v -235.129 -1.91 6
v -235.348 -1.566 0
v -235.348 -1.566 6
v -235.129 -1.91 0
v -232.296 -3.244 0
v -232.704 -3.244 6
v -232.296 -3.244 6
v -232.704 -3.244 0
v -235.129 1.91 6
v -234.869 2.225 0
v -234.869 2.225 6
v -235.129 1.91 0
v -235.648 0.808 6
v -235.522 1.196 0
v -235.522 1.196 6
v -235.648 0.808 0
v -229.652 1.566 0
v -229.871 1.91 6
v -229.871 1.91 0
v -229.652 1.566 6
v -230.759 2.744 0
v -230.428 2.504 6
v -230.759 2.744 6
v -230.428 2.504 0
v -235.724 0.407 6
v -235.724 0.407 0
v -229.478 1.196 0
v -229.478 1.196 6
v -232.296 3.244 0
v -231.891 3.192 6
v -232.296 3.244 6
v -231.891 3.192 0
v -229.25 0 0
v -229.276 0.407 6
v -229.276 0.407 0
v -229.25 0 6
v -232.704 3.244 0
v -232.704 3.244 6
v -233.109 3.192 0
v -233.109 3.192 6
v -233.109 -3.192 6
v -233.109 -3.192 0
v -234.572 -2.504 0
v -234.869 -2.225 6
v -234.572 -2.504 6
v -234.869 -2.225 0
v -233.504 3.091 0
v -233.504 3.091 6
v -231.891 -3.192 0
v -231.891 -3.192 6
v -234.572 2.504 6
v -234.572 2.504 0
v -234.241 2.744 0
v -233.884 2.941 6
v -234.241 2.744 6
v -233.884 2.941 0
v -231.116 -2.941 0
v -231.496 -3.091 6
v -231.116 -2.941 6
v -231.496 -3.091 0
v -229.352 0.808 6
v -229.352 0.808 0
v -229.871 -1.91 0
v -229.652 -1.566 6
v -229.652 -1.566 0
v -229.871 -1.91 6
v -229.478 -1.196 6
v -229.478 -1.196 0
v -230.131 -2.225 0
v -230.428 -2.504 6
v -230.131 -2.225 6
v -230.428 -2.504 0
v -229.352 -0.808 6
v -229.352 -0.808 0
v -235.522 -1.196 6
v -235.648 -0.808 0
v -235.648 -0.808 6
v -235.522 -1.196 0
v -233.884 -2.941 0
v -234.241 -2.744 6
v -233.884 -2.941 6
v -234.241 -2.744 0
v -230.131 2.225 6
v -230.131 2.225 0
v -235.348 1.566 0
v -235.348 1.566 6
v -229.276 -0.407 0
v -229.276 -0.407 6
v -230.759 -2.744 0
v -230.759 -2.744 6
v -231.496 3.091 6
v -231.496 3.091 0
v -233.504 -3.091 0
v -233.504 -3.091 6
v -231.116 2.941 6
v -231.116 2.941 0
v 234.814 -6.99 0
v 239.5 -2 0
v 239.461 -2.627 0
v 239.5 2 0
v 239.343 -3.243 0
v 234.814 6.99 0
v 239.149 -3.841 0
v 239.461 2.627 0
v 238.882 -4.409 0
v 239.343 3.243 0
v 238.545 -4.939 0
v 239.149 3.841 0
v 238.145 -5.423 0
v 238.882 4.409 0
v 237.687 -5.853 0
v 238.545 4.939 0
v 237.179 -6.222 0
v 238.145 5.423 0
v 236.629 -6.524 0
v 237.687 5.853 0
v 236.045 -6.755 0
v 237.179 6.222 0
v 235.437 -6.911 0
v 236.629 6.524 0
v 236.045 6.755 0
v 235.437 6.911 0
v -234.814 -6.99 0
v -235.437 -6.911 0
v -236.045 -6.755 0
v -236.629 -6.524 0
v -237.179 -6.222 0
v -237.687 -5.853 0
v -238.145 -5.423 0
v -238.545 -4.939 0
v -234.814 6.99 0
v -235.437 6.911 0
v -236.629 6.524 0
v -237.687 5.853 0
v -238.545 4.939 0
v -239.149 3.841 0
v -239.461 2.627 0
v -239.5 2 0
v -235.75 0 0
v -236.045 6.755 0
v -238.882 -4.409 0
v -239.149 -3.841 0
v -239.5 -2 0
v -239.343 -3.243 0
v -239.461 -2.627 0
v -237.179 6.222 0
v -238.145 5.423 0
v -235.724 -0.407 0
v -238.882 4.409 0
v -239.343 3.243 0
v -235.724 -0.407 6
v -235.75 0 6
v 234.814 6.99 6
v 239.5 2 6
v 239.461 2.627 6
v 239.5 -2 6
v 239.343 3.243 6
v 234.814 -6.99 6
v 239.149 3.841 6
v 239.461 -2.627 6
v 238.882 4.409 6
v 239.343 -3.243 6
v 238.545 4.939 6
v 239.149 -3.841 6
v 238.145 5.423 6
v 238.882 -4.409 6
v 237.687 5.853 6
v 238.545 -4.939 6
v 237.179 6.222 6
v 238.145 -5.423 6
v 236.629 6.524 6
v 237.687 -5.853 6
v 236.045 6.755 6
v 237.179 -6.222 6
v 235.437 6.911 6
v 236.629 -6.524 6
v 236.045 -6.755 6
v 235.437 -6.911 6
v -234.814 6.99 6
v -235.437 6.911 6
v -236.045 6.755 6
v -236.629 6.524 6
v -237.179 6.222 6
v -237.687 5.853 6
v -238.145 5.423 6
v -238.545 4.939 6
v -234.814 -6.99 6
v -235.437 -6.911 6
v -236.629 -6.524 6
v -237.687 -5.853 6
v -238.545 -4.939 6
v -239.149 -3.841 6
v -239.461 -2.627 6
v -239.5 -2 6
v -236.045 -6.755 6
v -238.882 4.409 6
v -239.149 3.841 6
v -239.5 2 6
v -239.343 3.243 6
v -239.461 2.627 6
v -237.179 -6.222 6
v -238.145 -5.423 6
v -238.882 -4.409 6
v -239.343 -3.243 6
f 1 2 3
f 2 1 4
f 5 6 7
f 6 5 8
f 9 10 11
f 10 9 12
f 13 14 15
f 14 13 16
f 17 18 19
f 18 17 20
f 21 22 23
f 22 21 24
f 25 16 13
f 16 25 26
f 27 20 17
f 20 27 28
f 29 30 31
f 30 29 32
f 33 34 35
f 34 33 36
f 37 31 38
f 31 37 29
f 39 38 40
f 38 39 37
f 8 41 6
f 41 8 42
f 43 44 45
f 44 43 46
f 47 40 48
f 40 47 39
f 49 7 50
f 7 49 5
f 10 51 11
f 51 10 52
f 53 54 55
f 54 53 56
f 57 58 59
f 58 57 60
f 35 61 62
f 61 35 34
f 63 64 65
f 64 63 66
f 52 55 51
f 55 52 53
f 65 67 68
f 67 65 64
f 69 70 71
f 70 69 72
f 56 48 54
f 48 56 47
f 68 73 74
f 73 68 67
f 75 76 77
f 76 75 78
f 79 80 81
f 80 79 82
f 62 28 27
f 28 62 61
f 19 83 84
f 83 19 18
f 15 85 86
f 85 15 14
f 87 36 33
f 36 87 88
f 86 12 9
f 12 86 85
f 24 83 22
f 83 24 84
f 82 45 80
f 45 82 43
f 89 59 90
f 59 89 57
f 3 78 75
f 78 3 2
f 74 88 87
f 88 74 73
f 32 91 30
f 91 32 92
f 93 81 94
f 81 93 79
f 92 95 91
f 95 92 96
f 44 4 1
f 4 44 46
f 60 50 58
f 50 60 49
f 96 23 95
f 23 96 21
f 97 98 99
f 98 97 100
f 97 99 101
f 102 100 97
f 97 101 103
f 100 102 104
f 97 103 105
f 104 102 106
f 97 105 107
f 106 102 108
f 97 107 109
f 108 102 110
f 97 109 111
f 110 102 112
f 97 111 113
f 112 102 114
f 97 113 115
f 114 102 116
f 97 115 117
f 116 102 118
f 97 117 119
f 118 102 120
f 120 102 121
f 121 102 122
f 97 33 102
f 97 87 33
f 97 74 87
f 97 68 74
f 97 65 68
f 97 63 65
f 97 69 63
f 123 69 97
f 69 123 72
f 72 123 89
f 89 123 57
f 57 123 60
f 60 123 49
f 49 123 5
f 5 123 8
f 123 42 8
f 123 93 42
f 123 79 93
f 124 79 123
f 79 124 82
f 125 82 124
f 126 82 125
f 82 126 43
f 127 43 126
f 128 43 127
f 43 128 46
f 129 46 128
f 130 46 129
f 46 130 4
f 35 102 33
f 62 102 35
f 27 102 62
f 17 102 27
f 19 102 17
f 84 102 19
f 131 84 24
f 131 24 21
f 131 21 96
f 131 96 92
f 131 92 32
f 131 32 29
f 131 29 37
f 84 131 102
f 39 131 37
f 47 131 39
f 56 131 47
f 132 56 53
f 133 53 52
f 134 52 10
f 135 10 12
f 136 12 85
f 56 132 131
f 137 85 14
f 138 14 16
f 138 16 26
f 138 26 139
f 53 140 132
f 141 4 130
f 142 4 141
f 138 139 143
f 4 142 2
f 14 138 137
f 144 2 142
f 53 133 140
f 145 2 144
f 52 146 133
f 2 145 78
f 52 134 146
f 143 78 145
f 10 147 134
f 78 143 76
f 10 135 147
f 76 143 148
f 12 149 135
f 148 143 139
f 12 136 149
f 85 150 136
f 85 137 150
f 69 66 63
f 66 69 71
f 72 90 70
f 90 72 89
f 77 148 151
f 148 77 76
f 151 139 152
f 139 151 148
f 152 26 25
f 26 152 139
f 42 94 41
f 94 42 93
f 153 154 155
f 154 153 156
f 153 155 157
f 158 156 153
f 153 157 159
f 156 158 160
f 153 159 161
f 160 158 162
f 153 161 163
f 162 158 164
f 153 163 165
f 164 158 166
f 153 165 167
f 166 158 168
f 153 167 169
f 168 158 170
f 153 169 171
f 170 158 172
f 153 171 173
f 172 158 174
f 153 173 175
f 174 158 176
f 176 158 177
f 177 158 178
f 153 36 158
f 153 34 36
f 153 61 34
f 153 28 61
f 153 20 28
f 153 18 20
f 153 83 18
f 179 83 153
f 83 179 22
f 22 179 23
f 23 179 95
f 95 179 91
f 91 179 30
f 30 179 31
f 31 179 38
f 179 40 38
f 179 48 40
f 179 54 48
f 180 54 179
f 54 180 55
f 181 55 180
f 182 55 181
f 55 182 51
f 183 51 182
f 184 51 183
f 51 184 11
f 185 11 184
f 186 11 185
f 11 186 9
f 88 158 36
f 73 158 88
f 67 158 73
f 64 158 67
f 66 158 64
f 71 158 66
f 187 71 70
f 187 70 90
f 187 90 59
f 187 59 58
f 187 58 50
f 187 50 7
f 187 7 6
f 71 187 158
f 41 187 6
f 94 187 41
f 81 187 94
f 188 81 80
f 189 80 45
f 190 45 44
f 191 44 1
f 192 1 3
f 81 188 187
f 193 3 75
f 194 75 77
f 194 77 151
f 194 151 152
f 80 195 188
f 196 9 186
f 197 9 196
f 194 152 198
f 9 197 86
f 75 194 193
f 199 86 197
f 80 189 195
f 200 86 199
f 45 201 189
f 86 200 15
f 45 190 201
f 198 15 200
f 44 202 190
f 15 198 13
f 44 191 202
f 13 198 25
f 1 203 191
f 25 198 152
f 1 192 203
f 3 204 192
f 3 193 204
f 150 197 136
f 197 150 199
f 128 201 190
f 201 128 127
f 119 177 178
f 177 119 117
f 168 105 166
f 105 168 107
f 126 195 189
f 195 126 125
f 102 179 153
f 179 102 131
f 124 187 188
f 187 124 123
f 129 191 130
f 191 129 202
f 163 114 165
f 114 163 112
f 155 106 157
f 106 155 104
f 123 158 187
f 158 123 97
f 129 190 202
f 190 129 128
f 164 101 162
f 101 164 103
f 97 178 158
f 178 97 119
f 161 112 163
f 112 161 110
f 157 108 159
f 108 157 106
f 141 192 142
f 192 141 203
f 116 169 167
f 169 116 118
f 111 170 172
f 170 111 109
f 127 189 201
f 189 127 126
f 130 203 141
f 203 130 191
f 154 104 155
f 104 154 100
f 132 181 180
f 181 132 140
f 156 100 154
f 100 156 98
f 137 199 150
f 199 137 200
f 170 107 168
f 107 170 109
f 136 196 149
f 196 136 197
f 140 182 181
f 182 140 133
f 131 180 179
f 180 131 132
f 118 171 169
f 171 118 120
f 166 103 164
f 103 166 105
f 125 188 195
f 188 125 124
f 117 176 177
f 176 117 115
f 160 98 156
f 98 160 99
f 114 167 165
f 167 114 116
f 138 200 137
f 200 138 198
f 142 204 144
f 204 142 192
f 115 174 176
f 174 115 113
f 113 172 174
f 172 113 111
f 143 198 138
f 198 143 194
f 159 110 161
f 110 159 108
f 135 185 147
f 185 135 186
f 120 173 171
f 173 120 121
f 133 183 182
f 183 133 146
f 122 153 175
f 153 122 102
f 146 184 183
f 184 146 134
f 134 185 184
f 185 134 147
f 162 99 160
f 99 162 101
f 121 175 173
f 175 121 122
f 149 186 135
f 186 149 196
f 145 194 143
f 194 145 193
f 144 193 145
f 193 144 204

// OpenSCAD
$fn = 50;


difference() {
	union() {
		hull() {
			translate(v = [-234.5000000000, 2.0000000000, 0]) {
				cylinder(h = 6, r = 5);
			}
			translate(v = [234.5000000000, 2.0000000000, 0]) {
				cylinder(h = 6, r = 5);
			}
			translate(v = [-234.5000000000, -2.0000000000, 0]) {
				cylinder(h = 6, r = 5);
			}
			translate(v = [234.5000000000, -2.0000000000, 0]) {
				cylinder(h = 6, r = 5);
			}
		}
	}
	union() {
		translate(v = [-232.5000000000, 0.0000000000, 0]) {
			cylinder(h = 6, r = 3.2500000000);
		}
		translate(v = [-232.5000000000, 0.0000000000, 0]) {
			cylinder(h = 6, r = 1.8000000000);
		}
		translate(v = [-232.5000000000, 0.0000000000, 0]) {
			cylinder(h = 6, r = 1.8000000000);
		}
		translate(v = [-232.5000000000, 0.0000000000, 0]) {
			cylinder(h = 6, r = 1.8000000000);
		}
	}
}
